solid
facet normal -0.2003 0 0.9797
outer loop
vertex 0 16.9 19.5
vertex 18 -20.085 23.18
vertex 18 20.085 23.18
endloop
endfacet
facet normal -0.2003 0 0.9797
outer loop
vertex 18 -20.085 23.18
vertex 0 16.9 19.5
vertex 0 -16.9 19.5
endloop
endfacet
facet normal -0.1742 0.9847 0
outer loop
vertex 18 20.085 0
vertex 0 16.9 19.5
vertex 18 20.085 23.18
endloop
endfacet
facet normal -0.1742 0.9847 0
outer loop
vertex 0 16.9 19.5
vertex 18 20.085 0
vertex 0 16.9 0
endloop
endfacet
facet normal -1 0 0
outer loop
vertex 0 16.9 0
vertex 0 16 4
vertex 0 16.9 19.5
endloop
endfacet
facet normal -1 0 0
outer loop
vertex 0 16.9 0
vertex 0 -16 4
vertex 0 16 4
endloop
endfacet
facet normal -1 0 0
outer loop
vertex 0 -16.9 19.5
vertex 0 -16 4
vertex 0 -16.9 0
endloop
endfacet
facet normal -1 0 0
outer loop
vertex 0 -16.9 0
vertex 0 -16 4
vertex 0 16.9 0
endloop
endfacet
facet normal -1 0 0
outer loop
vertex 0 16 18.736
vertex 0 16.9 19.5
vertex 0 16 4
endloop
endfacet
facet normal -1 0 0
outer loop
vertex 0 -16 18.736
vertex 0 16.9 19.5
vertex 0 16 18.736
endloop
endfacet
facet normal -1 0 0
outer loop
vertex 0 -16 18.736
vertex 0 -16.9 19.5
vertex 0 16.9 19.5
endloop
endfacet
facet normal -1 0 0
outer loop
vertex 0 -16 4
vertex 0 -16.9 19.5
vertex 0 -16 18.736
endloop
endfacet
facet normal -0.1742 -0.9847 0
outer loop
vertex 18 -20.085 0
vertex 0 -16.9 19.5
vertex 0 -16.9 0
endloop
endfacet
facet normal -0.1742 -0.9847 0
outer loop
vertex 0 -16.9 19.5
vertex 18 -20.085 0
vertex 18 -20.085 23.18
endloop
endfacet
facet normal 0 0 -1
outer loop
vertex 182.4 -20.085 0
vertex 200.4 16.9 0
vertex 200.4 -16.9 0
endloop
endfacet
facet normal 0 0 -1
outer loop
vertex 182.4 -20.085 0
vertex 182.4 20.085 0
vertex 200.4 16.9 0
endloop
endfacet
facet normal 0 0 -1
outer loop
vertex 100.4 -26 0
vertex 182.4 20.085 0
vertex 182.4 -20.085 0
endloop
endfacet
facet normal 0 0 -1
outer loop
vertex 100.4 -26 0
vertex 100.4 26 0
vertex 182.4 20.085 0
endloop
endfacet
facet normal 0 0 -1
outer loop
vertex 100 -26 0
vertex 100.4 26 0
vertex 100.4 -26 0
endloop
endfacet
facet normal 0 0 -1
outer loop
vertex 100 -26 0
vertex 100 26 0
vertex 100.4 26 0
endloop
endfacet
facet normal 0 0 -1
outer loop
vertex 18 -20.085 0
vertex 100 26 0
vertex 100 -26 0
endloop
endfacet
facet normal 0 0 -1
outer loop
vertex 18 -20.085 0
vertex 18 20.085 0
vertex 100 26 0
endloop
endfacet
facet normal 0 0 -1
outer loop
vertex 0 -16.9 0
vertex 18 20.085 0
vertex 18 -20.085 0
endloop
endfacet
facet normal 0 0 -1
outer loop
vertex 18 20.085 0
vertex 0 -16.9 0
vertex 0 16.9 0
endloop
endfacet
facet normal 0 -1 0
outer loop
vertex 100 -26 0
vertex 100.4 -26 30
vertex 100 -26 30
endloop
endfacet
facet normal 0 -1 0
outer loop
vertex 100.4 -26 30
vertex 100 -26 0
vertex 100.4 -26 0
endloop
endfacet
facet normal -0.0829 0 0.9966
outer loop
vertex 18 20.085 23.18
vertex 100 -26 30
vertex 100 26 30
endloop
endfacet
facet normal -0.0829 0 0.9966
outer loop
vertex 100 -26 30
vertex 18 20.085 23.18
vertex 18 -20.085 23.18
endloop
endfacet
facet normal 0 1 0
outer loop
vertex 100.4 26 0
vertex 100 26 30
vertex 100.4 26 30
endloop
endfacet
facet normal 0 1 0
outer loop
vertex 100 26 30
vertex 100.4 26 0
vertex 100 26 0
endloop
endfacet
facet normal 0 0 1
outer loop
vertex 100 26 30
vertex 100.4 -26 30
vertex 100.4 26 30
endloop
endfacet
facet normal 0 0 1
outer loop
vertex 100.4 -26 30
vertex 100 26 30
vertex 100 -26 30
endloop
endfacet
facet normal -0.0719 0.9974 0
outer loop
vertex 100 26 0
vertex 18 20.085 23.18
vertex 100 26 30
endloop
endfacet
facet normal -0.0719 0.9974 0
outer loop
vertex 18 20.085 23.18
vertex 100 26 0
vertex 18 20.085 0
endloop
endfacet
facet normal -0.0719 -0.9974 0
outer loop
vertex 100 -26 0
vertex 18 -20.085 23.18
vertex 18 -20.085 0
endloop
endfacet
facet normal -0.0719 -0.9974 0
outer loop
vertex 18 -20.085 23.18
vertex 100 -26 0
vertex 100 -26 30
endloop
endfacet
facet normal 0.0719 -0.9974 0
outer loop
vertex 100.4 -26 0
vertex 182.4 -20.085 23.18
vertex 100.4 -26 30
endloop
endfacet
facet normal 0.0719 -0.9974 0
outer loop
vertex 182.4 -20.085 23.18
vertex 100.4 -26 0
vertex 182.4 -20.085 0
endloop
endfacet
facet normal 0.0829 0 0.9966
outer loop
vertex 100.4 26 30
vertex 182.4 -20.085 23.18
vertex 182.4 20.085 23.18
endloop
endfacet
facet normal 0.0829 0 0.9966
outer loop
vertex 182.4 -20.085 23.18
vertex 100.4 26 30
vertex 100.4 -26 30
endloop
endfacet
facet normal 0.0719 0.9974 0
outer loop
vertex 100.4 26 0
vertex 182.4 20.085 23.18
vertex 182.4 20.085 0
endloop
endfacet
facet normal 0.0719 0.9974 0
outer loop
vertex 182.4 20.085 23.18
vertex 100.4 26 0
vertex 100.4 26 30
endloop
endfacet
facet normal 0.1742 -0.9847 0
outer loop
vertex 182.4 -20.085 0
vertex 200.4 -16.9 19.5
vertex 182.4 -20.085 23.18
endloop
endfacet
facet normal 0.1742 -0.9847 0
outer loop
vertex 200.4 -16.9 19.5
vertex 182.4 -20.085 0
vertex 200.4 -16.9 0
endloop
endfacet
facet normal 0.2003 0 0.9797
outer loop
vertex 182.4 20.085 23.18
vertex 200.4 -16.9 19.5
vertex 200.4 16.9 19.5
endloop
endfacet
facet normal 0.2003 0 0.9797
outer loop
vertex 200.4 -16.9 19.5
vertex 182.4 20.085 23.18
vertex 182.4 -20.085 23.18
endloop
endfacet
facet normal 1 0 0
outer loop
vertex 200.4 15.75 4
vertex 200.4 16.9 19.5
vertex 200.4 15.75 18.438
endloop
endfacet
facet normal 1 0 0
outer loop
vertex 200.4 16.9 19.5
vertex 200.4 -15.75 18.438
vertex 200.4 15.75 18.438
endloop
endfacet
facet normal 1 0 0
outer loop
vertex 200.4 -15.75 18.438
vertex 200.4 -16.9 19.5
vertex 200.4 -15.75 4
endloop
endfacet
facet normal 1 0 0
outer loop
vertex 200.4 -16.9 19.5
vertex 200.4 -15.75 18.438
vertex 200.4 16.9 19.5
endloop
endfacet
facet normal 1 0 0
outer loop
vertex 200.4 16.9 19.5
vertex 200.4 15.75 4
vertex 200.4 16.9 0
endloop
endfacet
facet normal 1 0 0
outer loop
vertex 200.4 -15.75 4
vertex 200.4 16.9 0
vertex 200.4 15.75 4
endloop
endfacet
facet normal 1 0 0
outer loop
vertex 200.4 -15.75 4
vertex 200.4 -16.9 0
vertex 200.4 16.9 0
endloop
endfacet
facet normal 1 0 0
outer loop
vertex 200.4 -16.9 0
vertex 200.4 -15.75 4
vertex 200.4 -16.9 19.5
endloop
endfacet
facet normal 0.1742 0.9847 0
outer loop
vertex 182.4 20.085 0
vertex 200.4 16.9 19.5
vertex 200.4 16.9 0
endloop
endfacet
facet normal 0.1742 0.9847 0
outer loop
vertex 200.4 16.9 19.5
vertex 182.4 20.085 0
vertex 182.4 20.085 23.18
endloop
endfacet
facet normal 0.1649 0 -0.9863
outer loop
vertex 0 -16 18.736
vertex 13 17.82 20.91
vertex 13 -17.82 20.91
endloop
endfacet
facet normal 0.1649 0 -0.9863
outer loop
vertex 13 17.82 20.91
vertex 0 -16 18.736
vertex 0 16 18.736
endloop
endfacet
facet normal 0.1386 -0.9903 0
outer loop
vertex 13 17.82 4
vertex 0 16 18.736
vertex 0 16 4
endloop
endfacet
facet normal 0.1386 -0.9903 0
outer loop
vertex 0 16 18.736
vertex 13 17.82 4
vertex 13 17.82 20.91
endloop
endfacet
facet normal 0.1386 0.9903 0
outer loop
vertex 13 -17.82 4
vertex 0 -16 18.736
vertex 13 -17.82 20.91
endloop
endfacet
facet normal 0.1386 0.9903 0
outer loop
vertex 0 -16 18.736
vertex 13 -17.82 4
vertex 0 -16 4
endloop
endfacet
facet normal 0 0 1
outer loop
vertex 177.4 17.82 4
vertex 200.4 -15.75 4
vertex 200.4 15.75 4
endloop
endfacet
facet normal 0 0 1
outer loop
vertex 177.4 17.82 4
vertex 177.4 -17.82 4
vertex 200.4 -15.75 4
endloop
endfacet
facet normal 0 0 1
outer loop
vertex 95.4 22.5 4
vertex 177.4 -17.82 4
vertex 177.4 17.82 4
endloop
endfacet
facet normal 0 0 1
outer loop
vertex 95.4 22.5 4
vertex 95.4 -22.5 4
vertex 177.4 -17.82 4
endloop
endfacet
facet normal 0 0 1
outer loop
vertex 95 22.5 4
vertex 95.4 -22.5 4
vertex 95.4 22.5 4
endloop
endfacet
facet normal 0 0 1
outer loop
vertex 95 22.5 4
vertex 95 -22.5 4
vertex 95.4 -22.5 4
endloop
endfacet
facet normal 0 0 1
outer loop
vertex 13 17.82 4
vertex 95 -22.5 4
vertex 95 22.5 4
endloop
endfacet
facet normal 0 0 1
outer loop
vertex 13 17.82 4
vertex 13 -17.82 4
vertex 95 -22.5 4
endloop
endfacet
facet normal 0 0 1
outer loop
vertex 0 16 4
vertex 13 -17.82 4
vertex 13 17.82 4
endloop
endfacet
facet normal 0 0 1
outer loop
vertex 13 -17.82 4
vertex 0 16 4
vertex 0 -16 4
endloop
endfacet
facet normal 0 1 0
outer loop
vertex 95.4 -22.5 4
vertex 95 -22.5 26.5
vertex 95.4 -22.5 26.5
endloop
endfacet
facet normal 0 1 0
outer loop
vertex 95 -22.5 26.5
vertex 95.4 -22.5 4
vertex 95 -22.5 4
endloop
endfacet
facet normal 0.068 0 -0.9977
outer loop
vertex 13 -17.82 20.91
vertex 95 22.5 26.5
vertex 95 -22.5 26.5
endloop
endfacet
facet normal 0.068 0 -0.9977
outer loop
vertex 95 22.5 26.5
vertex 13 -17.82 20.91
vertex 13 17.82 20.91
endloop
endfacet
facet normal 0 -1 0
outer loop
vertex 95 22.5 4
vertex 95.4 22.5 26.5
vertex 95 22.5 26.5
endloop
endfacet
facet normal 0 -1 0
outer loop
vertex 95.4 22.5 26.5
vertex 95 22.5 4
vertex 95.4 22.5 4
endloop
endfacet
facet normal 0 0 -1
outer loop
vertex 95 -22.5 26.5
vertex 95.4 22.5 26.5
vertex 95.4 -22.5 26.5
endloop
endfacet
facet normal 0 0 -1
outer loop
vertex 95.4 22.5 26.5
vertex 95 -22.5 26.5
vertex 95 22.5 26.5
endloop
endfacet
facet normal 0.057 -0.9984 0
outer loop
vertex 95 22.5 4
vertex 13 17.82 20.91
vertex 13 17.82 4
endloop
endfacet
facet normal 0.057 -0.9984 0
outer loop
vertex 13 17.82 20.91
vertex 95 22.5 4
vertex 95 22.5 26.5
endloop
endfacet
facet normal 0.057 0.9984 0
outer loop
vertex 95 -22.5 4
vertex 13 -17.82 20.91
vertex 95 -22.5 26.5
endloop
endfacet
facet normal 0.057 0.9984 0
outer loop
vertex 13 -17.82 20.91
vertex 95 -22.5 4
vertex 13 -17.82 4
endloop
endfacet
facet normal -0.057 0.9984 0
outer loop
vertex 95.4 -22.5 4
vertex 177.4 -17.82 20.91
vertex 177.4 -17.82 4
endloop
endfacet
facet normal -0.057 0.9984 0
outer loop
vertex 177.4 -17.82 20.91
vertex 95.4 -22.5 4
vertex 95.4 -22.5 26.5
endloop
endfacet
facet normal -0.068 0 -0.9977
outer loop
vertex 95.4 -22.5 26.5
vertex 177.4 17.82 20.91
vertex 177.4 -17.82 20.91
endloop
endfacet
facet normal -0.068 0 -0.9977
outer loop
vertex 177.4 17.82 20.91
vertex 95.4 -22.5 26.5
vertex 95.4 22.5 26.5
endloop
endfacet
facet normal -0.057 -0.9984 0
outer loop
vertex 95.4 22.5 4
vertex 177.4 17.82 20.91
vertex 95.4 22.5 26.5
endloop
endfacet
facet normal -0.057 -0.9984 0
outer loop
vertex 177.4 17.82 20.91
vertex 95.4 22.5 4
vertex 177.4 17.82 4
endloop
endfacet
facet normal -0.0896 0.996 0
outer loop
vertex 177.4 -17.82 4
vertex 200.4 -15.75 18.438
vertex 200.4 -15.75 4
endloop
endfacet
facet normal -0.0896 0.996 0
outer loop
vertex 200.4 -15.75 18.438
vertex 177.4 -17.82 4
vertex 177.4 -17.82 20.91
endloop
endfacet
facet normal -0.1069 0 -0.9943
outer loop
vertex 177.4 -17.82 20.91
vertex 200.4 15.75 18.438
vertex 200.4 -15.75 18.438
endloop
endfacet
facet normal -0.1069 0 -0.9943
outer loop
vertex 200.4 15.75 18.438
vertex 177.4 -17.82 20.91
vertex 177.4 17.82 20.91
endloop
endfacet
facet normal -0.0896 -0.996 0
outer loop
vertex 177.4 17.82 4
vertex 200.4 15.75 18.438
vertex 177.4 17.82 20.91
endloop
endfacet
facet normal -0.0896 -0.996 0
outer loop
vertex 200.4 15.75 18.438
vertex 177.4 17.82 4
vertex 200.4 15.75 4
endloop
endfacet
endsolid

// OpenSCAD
$fn = 32;

// ----------------------------------------------------------------------
// Faired channel: 200 x 52 x 30 mm, 3.5 mm walls, faired ends
// ----------------------------------------------------------------------

// --- parameters (mm) ---
length = 200;             // channel length
width = 52;               // channel width at mid length
height = 30;              // channel height at mid length
wall = 3.5;               // side wall thickness
floor_t = 4;              // floor thickness
end_w = 33.8;             // faired end width
end_h = 19.5;             // faired end height

difference() {
  union() {
    hull() {
      translate([0, -16.9, 0]) cube([0.4, 33.8, 19.5]);
      translate([18, -20.085, 0]) cube([0.4, 40.17, 23.18]);
    }
    hull() {
      translate([18, -20.085, 0]) cube([0.4, 40.17, 23.18]);
      translate([100, -26, 0]) cube([0.4, 52, 30]);
    }
    hull() {
      translate([100, -26, 0]) cube([0.4, 52, 30]);
      translate([182, -20.085, 0]) cube([0.4, 40.17, 23.18]);
    }
    hull() {
      translate([182, -20.085, 0]) cube([0.4, 40.17, 23.18]);
      translate([200, -16.9, 0]) cube([0.4, 33.8, 19.5]);
    }
  }
  /* cavity, 5 mm proud of both ends so the ports are cut clean */
  hull() {
    translate([-5, -15.3, 4]) cube([0.4, 30.6, 13.9]);
    translate([13, -17.82, 4]) cube([0.4, 35.64, 16.91]);
  }
  hull() {
    translate([13, -17.82, 4]) cube([0.4, 35.64, 16.91]);
    translate([95, -22.5, 4]) cube([0.4, 45, 22.5]);
  }
  hull() {
    translate([95, -22.5, 4]) cube([0.4, 45, 22.5]);
    translate([177, -17.82, 4]) cube([0.4, 35.64, 16.91]);
  }
  hull() {
    translate([177, -17.82, 4]) cube([0.4, 35.64, 16.91]);
    translate([205, -15.3, 4]) cube([0.4, 30.6, 13.9]);
  }
}
